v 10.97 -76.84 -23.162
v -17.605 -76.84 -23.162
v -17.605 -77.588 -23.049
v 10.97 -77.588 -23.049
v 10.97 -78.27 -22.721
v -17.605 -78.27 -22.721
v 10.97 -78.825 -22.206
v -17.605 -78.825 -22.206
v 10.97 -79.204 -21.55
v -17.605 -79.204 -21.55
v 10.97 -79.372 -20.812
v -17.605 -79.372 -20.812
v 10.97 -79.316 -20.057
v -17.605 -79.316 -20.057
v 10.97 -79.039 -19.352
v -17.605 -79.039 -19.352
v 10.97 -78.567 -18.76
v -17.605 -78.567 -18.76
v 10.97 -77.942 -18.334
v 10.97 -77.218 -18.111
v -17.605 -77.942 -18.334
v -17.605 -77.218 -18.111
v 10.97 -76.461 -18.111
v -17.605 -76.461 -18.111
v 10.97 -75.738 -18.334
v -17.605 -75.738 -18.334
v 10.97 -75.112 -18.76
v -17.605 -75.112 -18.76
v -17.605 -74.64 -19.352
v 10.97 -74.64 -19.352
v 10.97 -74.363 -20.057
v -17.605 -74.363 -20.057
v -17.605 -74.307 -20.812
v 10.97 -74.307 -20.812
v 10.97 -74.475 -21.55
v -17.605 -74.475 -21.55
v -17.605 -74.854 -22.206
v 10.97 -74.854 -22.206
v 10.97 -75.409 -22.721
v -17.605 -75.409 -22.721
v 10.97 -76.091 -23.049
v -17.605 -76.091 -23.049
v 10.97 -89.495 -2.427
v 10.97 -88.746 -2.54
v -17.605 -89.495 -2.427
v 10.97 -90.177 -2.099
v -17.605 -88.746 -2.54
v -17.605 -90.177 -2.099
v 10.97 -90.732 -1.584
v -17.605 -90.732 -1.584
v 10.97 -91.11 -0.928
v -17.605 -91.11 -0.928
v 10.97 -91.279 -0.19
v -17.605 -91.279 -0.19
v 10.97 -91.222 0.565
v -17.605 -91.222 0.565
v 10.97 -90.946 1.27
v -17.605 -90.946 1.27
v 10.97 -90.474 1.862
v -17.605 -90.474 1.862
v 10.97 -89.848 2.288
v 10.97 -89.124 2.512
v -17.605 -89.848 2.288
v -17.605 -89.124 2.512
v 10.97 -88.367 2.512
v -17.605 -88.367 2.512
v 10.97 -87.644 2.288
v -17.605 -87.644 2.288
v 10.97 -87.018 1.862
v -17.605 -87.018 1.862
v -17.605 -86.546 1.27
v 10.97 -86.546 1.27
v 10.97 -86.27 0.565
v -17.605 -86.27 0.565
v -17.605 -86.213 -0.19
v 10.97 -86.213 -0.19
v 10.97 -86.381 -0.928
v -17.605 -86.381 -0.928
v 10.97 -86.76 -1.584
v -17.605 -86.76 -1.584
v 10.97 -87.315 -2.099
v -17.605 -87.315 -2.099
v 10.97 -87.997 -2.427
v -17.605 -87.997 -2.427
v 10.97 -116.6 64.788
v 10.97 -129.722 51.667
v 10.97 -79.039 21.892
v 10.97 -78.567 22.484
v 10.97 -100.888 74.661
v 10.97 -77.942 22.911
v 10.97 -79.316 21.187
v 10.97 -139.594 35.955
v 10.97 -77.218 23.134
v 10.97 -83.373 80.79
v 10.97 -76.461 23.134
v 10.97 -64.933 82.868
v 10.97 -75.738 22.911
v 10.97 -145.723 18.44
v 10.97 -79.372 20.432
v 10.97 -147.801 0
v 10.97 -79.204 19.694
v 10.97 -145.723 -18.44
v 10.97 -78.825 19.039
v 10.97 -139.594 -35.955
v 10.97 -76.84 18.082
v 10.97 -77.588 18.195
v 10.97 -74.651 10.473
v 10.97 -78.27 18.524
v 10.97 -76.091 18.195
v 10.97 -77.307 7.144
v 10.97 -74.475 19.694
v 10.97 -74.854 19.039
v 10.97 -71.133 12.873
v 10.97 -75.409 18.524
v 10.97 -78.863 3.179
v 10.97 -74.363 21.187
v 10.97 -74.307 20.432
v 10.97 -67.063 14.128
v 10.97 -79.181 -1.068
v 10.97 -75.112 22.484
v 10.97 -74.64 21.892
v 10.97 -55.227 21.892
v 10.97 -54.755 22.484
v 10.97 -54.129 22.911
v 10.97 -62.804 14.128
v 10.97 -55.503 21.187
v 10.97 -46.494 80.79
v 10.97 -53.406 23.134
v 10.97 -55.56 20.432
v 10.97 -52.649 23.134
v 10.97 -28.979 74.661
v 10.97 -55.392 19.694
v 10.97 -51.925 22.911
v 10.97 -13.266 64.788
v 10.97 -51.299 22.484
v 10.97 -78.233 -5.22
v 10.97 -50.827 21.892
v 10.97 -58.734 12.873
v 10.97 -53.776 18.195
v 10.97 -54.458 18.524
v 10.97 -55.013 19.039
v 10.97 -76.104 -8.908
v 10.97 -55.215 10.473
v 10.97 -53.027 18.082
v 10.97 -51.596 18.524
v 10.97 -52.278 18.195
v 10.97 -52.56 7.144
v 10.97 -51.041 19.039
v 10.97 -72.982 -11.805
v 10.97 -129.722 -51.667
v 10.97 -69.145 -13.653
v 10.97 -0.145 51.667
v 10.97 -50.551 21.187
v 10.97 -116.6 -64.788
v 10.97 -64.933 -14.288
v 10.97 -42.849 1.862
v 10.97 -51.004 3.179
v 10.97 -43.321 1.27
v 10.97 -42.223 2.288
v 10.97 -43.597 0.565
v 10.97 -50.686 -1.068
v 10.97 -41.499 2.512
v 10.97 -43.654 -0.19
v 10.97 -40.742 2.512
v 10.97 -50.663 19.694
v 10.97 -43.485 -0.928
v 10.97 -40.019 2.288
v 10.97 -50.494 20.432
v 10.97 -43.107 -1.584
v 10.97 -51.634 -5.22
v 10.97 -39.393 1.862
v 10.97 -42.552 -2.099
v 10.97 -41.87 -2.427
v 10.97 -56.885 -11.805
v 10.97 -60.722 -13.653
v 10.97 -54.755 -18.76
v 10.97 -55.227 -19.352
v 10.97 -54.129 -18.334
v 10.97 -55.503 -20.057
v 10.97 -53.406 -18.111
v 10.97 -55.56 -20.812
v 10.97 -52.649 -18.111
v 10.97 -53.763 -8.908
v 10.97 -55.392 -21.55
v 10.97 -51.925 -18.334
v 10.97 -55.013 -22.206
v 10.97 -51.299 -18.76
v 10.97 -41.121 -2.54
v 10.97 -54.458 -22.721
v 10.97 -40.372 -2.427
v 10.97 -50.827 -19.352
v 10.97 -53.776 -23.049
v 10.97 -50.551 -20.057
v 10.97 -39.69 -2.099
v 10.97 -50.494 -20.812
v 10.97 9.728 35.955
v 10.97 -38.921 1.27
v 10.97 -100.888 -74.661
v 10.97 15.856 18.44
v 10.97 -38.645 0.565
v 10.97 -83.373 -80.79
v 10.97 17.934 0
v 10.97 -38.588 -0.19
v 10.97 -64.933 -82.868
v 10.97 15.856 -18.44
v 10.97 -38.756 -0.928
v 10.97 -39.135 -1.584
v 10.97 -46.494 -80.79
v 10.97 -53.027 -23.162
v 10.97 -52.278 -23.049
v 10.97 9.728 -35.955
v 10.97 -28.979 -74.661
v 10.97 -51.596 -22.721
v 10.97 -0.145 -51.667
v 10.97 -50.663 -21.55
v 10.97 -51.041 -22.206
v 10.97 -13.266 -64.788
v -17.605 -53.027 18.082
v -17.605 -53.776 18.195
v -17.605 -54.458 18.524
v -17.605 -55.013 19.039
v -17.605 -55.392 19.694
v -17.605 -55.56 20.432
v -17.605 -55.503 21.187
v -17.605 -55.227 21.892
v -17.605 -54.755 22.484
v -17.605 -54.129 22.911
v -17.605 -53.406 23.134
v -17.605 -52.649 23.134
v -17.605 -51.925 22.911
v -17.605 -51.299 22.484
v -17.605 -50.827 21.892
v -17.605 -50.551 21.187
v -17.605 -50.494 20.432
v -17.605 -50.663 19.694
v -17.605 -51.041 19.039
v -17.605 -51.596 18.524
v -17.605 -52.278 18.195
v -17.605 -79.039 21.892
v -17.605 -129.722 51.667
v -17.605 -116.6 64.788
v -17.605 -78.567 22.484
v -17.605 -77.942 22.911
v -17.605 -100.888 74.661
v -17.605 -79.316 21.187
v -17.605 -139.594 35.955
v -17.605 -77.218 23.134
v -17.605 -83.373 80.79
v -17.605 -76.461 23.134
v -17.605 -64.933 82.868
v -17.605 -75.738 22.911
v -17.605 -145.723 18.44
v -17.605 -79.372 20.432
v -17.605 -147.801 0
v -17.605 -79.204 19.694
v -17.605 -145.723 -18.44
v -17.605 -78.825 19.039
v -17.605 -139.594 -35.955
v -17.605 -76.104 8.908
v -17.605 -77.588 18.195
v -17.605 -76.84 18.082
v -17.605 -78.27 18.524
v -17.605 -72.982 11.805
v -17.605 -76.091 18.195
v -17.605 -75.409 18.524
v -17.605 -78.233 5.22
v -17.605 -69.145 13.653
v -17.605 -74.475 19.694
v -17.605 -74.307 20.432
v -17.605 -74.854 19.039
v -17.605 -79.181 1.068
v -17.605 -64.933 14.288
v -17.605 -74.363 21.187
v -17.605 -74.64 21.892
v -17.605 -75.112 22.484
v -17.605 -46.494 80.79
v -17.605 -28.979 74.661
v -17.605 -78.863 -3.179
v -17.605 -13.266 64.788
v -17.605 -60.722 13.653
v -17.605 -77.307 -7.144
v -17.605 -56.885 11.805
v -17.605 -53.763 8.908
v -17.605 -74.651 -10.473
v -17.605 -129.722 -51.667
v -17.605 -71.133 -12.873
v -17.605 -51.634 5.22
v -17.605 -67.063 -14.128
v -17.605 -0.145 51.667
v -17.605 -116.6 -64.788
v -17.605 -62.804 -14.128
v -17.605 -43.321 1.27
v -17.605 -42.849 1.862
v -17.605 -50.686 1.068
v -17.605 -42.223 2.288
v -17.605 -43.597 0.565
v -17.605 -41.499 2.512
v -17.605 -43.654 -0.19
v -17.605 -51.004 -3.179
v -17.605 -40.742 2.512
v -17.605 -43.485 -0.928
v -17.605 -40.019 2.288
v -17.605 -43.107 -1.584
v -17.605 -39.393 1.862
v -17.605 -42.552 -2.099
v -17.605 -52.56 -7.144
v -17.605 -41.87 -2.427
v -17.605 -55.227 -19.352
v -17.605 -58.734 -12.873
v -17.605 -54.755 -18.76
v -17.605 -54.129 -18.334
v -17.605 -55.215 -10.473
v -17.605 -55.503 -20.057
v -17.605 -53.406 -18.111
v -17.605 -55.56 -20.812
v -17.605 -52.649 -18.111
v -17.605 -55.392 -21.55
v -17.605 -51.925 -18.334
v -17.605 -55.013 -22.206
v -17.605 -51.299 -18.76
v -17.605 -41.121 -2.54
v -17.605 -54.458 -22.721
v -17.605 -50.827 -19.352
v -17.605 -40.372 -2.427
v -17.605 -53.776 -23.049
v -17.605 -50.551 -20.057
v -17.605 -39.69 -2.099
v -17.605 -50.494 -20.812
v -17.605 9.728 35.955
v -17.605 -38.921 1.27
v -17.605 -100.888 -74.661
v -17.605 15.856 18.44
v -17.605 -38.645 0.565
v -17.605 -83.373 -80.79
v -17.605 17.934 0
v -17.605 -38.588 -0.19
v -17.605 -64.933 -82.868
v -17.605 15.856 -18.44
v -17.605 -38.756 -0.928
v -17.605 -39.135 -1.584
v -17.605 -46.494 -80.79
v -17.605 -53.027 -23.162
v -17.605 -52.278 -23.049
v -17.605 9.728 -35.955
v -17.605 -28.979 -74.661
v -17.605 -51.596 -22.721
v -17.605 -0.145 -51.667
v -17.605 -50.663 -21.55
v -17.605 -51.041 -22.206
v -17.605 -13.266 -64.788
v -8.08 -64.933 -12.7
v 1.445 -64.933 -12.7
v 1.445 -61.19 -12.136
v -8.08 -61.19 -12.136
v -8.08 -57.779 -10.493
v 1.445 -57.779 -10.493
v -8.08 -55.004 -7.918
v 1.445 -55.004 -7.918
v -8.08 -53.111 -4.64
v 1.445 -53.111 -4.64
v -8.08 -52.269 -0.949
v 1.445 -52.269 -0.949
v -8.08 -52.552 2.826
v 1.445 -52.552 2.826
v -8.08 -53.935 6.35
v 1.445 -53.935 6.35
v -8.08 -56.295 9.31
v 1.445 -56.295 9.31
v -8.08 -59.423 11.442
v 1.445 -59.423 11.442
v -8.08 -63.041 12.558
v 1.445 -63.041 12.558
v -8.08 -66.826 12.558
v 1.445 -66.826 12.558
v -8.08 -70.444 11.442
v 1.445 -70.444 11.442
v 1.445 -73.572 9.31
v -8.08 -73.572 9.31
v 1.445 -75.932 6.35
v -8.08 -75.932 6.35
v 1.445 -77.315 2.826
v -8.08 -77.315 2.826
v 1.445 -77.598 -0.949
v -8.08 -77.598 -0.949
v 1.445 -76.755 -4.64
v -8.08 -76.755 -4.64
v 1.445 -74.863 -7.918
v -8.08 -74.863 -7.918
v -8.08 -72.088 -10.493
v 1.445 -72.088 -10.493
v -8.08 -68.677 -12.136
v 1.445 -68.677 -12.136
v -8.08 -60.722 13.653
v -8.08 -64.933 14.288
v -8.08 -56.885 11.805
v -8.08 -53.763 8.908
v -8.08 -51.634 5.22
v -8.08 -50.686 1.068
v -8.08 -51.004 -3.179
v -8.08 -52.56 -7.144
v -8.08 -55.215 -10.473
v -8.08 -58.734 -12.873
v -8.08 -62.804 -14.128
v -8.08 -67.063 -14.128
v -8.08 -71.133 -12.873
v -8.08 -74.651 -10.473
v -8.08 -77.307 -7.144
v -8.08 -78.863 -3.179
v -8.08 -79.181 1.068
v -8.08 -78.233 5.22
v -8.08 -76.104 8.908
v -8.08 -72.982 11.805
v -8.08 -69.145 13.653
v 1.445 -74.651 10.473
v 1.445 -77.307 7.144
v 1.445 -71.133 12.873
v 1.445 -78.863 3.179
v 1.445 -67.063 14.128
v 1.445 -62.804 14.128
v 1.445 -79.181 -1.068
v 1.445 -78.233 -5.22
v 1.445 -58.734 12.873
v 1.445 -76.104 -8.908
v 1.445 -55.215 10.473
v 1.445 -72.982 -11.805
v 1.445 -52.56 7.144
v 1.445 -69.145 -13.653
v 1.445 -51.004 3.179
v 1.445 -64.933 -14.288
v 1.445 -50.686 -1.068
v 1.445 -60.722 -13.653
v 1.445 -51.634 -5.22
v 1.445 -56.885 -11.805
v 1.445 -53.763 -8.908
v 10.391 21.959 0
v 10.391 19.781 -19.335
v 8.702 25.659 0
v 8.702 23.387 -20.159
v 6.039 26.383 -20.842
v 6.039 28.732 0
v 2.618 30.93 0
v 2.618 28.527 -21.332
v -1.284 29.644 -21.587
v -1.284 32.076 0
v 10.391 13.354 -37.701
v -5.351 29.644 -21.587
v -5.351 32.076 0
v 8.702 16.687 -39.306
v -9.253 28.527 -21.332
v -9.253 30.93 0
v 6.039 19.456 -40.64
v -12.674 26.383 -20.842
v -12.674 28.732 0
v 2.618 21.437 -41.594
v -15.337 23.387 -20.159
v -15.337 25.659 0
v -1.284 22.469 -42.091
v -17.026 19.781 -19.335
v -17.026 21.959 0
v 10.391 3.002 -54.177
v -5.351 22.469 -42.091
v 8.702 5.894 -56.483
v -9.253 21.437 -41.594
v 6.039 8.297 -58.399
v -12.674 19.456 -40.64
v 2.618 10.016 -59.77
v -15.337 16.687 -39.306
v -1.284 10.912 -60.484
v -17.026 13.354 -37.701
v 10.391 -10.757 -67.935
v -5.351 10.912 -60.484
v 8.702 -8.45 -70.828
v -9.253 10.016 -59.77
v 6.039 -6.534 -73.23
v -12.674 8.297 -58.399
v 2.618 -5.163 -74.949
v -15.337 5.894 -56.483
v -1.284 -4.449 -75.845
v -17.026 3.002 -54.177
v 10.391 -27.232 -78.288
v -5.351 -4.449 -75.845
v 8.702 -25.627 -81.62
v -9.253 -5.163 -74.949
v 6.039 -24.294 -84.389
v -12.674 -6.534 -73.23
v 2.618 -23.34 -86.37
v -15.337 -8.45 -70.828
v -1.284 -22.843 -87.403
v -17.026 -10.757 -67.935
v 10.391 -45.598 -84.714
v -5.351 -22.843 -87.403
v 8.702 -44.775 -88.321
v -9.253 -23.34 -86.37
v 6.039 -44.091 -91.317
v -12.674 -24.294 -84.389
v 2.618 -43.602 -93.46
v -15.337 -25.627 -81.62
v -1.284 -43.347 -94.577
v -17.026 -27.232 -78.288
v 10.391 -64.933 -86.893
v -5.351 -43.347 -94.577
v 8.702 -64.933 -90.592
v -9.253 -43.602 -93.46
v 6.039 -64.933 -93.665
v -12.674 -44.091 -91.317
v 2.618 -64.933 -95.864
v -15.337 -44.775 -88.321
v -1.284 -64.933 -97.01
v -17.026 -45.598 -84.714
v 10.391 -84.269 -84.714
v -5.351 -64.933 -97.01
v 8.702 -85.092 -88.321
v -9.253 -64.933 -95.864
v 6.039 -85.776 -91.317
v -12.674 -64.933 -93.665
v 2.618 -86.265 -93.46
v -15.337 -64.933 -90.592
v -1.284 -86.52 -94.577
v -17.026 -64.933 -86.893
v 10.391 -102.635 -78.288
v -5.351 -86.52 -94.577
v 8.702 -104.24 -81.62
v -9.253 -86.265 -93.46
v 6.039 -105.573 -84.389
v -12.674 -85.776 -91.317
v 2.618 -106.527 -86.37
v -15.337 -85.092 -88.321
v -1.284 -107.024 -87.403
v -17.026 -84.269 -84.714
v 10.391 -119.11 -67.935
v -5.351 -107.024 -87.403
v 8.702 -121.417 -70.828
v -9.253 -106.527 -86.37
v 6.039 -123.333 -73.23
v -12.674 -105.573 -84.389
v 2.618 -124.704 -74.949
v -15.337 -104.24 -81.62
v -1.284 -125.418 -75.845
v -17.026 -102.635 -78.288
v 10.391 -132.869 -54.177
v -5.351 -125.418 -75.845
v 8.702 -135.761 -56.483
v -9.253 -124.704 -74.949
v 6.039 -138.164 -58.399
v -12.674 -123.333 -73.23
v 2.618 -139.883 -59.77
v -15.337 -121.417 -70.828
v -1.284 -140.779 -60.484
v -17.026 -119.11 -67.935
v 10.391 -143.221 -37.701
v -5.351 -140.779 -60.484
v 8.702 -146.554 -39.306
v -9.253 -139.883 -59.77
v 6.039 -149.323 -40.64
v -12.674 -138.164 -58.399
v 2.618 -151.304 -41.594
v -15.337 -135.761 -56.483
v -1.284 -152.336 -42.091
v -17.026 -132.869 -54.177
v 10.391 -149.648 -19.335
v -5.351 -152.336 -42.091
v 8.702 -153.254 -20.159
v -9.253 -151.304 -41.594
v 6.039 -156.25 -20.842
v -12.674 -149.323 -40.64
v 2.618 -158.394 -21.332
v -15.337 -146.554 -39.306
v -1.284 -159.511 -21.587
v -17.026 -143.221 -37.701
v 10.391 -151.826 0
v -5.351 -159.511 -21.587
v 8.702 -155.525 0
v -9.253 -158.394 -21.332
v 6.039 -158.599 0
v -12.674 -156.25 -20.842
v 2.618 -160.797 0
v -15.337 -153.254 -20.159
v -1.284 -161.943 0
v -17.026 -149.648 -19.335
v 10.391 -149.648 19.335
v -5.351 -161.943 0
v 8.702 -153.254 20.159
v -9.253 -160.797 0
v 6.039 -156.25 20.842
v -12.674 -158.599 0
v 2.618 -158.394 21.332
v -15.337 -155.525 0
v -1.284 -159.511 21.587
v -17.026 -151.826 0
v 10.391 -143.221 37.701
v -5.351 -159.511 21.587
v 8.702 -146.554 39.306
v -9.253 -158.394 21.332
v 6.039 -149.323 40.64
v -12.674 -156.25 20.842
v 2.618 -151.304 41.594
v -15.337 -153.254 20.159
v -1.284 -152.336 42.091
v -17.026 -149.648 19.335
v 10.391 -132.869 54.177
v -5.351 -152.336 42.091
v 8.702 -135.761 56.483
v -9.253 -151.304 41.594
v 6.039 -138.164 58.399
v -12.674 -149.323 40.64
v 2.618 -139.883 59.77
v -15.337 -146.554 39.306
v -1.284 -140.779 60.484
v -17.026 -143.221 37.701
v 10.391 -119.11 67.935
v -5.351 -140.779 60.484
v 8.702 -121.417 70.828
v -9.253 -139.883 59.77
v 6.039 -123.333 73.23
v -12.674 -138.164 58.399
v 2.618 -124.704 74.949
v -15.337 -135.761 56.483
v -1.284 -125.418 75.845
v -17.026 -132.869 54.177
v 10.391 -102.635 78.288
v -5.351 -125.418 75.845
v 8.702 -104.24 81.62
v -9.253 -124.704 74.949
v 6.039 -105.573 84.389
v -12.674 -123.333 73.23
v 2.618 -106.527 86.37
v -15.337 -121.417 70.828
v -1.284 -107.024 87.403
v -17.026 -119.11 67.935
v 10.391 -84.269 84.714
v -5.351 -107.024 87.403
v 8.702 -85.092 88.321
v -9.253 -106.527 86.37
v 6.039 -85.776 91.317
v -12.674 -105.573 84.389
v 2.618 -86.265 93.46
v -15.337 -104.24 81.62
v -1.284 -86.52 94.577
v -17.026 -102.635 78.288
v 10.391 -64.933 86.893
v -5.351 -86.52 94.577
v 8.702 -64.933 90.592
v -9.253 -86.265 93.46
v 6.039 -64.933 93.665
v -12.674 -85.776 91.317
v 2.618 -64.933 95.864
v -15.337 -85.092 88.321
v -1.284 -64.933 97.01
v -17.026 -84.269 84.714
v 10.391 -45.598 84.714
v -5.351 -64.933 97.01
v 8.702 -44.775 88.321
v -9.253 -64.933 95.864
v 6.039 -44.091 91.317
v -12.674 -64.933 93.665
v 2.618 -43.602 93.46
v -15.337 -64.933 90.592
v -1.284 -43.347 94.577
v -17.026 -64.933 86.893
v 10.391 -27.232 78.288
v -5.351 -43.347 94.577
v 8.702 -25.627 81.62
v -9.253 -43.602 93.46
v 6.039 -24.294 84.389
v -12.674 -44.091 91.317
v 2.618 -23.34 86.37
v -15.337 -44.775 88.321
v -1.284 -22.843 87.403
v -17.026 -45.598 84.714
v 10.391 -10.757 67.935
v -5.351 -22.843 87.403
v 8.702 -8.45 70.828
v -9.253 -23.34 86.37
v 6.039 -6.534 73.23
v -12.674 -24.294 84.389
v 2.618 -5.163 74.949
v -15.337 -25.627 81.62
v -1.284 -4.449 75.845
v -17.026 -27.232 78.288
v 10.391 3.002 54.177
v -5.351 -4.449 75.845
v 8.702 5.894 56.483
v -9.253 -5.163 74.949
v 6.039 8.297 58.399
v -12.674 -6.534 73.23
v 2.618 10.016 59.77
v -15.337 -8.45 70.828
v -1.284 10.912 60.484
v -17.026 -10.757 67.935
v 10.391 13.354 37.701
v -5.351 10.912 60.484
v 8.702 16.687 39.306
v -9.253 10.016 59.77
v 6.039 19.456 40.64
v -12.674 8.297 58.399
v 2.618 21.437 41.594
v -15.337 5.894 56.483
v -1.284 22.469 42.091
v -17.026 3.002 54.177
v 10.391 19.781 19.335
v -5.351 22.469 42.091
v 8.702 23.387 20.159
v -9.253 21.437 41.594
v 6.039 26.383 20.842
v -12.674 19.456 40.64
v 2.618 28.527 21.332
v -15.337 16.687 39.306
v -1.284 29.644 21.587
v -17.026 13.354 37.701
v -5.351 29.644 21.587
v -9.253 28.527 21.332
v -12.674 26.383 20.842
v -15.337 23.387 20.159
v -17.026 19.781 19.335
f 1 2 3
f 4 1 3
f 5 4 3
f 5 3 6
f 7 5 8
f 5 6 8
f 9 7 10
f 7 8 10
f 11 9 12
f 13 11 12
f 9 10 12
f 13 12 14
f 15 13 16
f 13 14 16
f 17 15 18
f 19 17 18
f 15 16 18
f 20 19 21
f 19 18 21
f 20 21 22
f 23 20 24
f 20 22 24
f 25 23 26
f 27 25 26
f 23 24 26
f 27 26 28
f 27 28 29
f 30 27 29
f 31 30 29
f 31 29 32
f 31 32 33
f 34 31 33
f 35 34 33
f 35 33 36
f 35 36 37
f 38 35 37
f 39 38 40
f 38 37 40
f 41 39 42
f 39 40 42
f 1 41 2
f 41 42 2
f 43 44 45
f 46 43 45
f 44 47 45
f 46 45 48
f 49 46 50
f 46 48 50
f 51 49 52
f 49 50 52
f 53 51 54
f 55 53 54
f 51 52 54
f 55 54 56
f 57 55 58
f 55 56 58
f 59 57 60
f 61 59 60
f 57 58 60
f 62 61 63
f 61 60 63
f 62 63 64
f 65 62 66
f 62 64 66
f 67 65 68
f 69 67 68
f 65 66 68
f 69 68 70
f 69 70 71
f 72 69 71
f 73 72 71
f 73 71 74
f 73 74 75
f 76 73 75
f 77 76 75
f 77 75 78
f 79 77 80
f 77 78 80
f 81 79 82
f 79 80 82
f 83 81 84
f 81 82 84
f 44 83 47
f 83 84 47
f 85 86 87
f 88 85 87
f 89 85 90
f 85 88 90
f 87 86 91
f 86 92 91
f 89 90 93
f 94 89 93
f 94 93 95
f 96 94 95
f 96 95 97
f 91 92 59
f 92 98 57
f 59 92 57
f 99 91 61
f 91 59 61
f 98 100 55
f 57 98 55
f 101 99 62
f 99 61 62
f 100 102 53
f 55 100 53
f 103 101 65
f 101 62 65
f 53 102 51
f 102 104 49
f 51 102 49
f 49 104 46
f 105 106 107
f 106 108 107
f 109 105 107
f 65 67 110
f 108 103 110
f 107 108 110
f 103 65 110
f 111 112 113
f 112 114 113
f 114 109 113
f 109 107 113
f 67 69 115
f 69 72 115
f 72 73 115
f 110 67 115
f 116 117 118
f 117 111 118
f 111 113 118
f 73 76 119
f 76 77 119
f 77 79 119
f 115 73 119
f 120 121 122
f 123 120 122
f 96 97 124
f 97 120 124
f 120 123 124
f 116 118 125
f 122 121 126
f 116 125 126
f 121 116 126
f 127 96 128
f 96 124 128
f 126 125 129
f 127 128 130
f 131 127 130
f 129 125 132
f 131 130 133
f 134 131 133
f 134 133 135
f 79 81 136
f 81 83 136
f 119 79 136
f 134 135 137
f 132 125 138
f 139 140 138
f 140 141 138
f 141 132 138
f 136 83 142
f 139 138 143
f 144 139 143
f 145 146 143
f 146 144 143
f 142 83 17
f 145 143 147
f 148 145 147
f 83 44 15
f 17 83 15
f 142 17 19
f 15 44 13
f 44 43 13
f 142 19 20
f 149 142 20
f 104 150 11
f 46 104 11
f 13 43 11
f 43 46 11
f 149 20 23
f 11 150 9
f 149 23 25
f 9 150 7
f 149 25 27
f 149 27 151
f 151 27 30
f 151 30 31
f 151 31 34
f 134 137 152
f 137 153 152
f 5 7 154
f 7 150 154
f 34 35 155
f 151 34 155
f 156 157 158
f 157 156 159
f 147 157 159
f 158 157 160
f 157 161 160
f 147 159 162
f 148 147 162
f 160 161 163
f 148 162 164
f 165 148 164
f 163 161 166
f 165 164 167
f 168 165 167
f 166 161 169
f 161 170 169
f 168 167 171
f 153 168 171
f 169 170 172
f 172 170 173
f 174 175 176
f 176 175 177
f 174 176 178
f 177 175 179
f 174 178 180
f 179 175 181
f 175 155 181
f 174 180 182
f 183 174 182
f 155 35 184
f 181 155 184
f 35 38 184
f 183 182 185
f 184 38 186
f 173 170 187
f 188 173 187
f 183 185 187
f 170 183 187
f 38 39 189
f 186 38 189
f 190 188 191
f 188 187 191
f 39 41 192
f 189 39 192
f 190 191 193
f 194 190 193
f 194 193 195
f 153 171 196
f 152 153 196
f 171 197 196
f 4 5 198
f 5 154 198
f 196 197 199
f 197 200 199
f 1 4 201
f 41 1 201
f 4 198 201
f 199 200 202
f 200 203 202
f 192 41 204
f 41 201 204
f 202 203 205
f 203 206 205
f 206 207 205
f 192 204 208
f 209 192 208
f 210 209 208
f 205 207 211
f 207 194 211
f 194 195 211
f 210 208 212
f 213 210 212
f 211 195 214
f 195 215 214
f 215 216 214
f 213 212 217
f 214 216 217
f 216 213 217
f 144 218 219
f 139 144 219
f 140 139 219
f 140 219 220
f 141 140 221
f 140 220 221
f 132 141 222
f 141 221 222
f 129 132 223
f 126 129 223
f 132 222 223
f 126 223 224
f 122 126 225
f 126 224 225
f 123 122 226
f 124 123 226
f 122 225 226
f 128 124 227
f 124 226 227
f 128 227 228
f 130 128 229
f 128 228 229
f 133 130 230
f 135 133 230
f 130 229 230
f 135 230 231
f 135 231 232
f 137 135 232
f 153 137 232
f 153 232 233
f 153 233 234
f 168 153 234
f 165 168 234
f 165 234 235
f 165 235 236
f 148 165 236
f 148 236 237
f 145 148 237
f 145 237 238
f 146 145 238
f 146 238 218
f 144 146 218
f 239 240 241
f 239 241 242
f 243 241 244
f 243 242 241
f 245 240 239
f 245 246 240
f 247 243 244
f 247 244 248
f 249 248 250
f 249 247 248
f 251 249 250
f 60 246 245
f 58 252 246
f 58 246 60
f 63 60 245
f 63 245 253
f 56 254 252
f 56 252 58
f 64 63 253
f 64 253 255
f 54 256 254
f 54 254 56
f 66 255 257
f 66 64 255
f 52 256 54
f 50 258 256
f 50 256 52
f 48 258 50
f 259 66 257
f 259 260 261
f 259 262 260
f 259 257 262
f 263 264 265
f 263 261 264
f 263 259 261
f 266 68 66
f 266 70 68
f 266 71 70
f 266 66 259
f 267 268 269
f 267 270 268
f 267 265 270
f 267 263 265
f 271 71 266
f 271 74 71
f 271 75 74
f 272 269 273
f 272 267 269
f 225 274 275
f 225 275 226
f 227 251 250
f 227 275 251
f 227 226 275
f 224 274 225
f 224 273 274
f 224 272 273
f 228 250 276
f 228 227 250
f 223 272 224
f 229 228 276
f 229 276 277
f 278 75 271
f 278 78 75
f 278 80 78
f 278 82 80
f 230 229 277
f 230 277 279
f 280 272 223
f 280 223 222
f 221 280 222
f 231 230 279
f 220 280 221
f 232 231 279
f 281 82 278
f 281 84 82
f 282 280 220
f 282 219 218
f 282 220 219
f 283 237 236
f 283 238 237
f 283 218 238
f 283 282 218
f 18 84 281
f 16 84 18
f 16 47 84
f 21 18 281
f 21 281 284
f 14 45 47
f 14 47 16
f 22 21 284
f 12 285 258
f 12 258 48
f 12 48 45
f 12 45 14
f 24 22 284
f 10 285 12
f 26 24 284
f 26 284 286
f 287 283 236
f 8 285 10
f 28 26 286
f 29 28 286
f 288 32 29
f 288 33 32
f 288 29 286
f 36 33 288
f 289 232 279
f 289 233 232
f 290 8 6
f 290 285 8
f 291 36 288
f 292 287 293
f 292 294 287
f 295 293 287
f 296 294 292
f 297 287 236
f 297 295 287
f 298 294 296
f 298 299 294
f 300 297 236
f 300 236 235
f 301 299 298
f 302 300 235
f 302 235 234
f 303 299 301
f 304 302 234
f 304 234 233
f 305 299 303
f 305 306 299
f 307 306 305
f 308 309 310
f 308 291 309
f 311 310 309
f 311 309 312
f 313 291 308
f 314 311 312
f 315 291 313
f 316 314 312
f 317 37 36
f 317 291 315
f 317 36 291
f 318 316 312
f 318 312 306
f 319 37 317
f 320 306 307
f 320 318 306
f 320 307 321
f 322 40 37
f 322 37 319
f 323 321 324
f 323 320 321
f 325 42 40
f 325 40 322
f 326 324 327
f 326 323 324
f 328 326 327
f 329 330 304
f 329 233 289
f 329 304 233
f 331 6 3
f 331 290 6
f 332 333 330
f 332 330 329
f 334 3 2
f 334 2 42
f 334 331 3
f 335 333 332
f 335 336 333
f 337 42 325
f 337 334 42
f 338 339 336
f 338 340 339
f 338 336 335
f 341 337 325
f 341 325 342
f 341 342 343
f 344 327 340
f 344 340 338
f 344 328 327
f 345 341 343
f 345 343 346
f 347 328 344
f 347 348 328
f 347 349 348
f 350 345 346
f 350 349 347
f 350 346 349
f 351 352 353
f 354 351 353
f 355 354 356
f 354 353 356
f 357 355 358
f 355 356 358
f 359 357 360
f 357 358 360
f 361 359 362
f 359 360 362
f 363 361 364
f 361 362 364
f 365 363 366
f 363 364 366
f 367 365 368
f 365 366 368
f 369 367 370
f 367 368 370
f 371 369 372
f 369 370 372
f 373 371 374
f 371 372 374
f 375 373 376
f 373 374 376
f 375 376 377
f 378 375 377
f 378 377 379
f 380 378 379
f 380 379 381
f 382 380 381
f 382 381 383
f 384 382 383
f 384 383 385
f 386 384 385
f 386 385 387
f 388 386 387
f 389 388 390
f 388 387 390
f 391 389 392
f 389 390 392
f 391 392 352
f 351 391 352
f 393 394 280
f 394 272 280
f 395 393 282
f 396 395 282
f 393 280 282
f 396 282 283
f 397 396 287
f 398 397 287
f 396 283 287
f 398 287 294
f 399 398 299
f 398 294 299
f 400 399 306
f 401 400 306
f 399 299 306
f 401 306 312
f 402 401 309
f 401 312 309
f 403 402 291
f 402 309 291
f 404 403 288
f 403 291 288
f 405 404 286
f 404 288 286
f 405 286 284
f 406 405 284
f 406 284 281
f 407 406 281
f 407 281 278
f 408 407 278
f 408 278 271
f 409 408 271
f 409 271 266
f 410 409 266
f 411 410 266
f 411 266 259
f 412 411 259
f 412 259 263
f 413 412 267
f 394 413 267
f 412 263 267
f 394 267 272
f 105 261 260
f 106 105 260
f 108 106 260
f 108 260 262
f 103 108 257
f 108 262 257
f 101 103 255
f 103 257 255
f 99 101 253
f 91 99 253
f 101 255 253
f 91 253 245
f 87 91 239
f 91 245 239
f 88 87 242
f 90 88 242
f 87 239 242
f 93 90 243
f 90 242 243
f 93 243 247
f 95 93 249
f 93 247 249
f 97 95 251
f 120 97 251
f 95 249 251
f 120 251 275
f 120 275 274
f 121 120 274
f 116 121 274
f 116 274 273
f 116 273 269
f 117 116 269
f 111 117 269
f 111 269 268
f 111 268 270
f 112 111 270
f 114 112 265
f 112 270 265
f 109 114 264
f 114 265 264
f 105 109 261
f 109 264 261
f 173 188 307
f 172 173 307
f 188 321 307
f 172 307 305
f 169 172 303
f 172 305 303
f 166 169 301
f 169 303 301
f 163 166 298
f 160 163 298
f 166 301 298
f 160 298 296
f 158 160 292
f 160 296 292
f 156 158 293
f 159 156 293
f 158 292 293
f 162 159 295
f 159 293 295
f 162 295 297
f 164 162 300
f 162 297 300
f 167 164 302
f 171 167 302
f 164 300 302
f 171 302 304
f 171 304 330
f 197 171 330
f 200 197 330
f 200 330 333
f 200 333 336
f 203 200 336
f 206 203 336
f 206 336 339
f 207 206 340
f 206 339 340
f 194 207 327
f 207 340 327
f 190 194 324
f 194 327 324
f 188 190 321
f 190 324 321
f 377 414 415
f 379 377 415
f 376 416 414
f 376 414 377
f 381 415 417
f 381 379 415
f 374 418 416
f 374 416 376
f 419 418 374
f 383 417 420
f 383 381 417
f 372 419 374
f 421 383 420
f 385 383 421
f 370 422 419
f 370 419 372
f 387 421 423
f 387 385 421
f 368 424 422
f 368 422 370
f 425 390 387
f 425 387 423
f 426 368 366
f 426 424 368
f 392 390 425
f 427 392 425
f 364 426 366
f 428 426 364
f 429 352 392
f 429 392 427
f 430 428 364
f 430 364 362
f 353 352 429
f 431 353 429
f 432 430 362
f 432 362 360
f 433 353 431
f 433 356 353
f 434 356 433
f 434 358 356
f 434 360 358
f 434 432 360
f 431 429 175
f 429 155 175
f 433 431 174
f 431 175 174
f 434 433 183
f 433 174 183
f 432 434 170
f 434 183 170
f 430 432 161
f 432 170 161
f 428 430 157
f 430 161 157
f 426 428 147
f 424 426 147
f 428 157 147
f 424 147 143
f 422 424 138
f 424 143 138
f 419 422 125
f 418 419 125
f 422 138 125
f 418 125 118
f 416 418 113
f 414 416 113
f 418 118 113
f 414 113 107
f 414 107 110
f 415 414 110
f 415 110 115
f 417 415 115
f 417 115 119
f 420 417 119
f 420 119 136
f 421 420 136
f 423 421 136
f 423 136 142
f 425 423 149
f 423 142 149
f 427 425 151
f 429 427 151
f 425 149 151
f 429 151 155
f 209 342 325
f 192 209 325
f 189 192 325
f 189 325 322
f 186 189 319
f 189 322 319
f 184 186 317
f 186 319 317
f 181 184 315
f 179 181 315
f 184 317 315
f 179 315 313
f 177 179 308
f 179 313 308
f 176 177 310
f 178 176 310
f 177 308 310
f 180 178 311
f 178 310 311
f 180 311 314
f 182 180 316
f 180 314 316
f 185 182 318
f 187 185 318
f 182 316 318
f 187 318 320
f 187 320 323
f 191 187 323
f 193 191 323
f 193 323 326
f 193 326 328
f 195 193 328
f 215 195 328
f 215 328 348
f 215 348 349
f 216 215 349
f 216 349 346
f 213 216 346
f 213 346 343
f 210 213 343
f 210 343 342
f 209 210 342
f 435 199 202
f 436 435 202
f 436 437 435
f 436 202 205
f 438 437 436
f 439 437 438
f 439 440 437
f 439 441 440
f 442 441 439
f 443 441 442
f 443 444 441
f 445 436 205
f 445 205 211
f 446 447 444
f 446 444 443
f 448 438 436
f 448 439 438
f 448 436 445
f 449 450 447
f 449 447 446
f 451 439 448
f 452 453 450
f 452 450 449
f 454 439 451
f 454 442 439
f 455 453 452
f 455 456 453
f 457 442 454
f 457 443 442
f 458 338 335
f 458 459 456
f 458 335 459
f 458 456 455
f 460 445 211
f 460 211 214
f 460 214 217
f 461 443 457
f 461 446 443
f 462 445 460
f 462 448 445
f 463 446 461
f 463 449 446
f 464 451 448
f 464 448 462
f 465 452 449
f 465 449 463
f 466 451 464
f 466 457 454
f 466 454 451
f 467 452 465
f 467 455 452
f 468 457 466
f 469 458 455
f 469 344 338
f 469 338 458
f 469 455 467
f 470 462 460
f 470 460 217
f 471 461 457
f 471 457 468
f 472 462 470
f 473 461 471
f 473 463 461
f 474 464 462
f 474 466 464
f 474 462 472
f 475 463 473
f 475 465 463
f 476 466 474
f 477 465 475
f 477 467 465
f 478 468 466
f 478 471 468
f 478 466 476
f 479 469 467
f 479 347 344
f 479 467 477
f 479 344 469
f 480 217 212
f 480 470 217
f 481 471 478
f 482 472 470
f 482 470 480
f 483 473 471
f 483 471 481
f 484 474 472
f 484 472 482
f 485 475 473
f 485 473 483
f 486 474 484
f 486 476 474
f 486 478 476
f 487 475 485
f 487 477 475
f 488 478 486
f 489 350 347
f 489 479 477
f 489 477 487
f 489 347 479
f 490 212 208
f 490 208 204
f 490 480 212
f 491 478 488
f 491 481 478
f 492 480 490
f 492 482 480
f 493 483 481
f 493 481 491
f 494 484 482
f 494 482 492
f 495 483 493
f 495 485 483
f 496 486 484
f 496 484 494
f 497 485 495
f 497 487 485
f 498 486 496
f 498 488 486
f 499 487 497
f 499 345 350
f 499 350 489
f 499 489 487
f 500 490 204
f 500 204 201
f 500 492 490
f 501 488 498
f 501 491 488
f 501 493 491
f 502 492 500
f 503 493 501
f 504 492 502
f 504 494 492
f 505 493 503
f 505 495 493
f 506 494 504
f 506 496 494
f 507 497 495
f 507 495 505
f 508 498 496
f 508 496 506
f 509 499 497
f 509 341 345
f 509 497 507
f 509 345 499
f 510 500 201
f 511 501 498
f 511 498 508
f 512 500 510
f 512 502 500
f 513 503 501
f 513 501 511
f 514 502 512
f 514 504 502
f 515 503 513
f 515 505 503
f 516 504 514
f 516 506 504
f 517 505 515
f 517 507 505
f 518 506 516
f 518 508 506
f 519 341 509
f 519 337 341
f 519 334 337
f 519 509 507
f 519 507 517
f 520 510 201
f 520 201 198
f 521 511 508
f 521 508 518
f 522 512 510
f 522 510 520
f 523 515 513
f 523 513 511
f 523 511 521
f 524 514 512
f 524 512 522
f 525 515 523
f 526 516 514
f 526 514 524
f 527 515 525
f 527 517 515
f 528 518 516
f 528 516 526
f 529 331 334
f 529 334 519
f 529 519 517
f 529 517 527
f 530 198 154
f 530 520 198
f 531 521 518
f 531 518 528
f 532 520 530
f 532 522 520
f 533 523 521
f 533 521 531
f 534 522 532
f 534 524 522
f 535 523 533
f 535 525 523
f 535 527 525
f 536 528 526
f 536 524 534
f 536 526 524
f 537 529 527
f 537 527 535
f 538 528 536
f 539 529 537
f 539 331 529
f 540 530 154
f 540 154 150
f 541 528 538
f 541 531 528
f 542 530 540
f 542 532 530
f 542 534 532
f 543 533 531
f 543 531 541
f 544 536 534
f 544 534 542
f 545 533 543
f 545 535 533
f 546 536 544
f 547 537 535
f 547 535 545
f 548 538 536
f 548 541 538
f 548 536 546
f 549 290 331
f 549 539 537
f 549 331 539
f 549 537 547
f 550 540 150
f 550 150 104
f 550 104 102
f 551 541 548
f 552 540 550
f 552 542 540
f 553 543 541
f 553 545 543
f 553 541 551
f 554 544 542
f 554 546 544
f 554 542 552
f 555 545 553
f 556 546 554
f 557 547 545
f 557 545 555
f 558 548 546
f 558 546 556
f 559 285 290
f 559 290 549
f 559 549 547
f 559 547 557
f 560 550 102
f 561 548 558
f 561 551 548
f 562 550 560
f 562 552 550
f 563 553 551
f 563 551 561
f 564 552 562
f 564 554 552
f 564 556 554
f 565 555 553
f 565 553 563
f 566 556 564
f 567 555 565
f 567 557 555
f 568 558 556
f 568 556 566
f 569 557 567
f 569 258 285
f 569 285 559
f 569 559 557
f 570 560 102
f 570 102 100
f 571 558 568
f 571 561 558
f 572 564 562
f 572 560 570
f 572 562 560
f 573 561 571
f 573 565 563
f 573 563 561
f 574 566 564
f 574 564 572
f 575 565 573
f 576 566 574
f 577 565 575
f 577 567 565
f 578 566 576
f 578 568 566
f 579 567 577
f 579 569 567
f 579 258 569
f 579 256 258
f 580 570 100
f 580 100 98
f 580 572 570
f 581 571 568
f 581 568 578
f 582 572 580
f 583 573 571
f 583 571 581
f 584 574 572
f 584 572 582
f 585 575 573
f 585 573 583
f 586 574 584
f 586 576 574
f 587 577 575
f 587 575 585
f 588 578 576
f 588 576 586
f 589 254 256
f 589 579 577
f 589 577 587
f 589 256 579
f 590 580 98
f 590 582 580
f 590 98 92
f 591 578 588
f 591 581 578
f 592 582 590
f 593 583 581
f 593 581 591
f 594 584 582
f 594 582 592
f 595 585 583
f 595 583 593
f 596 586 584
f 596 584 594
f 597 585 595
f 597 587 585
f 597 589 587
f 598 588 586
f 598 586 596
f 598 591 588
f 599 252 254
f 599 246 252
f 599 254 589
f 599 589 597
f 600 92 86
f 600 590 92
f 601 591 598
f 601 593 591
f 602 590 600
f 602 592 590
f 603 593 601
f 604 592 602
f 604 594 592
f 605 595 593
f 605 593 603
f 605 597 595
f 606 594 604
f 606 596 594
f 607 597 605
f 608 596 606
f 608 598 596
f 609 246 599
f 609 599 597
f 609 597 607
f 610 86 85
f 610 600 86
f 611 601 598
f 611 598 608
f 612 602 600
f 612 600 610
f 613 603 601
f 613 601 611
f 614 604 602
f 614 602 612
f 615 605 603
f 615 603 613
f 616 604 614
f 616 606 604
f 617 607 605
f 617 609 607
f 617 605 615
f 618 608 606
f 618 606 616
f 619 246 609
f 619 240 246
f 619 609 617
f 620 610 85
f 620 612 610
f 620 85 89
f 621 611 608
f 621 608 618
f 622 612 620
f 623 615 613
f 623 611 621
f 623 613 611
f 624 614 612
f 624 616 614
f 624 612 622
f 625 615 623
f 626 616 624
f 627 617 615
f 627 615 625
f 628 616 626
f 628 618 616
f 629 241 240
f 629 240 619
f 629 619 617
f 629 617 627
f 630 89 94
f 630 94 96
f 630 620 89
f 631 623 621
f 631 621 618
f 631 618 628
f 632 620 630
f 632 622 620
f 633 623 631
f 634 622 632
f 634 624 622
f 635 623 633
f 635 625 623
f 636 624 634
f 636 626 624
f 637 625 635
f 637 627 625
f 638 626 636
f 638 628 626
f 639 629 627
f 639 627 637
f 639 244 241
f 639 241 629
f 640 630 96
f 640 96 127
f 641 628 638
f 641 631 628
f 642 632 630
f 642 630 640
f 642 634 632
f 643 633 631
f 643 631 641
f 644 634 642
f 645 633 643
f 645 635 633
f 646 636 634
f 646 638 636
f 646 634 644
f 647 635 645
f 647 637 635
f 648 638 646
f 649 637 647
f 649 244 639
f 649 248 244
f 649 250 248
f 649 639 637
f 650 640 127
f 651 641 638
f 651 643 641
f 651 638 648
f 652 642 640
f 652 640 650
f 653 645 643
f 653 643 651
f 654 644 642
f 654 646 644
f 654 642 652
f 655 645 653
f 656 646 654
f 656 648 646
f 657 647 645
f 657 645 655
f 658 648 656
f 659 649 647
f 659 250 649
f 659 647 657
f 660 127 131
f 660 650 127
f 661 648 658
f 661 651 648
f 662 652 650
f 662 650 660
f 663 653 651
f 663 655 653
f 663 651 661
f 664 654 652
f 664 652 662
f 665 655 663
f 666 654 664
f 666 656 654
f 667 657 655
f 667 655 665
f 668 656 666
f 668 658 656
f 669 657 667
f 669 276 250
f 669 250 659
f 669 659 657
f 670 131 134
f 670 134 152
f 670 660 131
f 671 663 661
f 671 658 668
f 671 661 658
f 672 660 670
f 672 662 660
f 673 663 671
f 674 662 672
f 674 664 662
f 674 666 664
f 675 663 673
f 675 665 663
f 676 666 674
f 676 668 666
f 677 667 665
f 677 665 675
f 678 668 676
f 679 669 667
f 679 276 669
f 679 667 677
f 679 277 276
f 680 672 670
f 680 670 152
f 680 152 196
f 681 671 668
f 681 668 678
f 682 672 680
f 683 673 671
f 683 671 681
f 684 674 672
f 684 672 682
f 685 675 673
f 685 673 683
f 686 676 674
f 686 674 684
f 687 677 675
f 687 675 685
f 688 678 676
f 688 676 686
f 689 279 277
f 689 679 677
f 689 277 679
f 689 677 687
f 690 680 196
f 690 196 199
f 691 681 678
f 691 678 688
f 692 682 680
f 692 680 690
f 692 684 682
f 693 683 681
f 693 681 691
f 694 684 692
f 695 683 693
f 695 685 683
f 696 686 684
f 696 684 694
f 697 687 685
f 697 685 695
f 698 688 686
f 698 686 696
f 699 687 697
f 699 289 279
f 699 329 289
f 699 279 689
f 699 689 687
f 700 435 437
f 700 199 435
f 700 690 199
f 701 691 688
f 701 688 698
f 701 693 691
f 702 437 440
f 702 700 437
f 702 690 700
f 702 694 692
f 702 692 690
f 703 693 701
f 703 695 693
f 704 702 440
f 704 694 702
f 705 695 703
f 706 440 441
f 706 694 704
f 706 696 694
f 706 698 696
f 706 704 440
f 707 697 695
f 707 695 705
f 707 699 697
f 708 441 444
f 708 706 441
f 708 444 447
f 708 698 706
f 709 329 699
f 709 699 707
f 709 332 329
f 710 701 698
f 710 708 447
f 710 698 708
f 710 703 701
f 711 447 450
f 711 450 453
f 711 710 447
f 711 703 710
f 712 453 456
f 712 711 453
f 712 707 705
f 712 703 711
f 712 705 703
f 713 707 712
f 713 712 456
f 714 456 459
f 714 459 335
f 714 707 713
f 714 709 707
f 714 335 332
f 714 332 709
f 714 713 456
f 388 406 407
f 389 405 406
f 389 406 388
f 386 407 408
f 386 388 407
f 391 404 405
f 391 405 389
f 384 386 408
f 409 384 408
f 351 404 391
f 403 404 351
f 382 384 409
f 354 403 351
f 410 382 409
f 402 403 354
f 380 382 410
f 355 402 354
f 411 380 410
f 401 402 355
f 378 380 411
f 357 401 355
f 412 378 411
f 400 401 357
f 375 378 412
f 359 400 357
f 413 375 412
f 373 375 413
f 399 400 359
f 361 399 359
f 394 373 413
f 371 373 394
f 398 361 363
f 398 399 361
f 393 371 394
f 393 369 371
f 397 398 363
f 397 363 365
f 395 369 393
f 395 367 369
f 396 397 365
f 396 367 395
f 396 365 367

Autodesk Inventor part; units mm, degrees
ref_plane "YZ Plane" through (0, 0, 0) normal (1, 0, 0) x (0, 1, 0)
ref_plane "XZ Plane" through (0, 0, 0) normal (0, 1, 0) x (-1, 0, 0)
ref_plane "XY Plane" through (0, 0, 0) normal (0, 0, 1) x (1, 0, 0)
sketch "Sketch1" plane through (0, 0, 0) normal (0, 0, 1) x (1, 0, 0)
  line L0 (-17.6048, 17.9341) -> (10.9702, 17.9341)
  line L1 (10.9702, 17.9341) -> (10.9702, -64.9334)
  line L2 (10.9702, -64.9334) -> (-17.6048, -64.9334)
  line L3 (-17.6048, -64.9334) -> (-17.6048, 17.9341)
  circle A0 centre (-3.3173, 17.9341) radius 14.2875
  point P0 (0, 0)
  dimension "d0" = 28.575
  dimension "d1" = 82.8675
revolve "Revolution1" add sketch "Sketch1" angle 360 about axis through (10.9702, -64.9334, 0) along (-1, 0, 0)
sketch "Sketch2" plane through (10.9702, -64.9334, 0) normal (1, 0, 0) x (0, 0, -1)
  circle A0 centre (0, 0) radius 82.8675 projected
  circle A1 centre (0, 0) radius 23.8125
  circle A2 centre (0, 0) radius 12.7
  line L0 (0, 0) -> (0, 42.8884)
  line L1 (37.1175, 21.4298) -> (0, 0)
  line L2 (0, 0) -> (31.3254, -18.0857)
  line L3 (31.3254, -18.0857) -> (0, 0)
  line L4 (0, 0) -> (0, -34.1508)
  line L5 (0, -34.1508) -> (0, 0)
  line L6 (0, 0) -> (-30.532, -17.6277)
  line L7 (-30.532, -17.6277) -> (0, 0)
  line L8 (0, 0) -> (-29.5082, 17.0365)
  circle A3 centre (0, 0) radius 14.2875
  point P0 (0, 64.9334)
  point P1 (0, 23.8125)
  point P2 (20.6222, 11.9063)
  point P3 (20.6222, -11.9062)
  point P4 (0, -23.8125)
  point P5 (-20.6222, -11.9063)
  point P6 (-20.6222, 11.9062)
  dimension "d3" = 47.625
  dimension "d4" = 25.4
  dimension "d5" = 60
  dimension "d6" = 60
  dimension "d7" = 60
  dimension "d8" = 60
  dimension "d16" = 28.575
hole "Hole1" at (10.9702, -41.1209, 0) at (10.9702, -53.0271, -20.6222) at (10.9702, -76.8396, -20.6222) at (10.9702, -88.7459, 0) at (10.9702, -76.8396, 20.6222) at (10.9702, -53.0271, 20.6222) direction (-1, 0, 0) diameter 5.08 depth 50.8 tip angle 118
extrude "Extrusion1" cut sketch "Sketch2" against normal blind 50.8 contours L1 L0 A2 | A2 L2 L1 | A2 L4 L2 | L0 L8 A2 | L4 A2 L6 | L6 A2 L8
extrude "Extrusion2" cut sketch "Sketch2" against normal blind 9.525 contours A3 L2 A2 L1 | L1 A2 L0 A3 | A3 L4 A2 L2 | L0 A2 L8 A3 | A3 L6 A2 L4 | L8 A2 L6 A3
sketch "Sketch3" plane through (-17.6048, -64.9334, 0) normal (-1, 0, 0) x (0, 0, 1)
  circle A0 centre (0, 0) radius 12.7 projected
  circle A1 centre (0, 0) radius 82.8675 projected
  circle A2 centre (0, 0) radius 14.2875
  point P0 (0, 64.9334)
  dimension "d21" = 28.575
extrude "Extrusion3" cut sketch "Sketch3" against normal blind 9.525 contours A2
properties part number "pneumatic 8'' wheel sketchy quality"
